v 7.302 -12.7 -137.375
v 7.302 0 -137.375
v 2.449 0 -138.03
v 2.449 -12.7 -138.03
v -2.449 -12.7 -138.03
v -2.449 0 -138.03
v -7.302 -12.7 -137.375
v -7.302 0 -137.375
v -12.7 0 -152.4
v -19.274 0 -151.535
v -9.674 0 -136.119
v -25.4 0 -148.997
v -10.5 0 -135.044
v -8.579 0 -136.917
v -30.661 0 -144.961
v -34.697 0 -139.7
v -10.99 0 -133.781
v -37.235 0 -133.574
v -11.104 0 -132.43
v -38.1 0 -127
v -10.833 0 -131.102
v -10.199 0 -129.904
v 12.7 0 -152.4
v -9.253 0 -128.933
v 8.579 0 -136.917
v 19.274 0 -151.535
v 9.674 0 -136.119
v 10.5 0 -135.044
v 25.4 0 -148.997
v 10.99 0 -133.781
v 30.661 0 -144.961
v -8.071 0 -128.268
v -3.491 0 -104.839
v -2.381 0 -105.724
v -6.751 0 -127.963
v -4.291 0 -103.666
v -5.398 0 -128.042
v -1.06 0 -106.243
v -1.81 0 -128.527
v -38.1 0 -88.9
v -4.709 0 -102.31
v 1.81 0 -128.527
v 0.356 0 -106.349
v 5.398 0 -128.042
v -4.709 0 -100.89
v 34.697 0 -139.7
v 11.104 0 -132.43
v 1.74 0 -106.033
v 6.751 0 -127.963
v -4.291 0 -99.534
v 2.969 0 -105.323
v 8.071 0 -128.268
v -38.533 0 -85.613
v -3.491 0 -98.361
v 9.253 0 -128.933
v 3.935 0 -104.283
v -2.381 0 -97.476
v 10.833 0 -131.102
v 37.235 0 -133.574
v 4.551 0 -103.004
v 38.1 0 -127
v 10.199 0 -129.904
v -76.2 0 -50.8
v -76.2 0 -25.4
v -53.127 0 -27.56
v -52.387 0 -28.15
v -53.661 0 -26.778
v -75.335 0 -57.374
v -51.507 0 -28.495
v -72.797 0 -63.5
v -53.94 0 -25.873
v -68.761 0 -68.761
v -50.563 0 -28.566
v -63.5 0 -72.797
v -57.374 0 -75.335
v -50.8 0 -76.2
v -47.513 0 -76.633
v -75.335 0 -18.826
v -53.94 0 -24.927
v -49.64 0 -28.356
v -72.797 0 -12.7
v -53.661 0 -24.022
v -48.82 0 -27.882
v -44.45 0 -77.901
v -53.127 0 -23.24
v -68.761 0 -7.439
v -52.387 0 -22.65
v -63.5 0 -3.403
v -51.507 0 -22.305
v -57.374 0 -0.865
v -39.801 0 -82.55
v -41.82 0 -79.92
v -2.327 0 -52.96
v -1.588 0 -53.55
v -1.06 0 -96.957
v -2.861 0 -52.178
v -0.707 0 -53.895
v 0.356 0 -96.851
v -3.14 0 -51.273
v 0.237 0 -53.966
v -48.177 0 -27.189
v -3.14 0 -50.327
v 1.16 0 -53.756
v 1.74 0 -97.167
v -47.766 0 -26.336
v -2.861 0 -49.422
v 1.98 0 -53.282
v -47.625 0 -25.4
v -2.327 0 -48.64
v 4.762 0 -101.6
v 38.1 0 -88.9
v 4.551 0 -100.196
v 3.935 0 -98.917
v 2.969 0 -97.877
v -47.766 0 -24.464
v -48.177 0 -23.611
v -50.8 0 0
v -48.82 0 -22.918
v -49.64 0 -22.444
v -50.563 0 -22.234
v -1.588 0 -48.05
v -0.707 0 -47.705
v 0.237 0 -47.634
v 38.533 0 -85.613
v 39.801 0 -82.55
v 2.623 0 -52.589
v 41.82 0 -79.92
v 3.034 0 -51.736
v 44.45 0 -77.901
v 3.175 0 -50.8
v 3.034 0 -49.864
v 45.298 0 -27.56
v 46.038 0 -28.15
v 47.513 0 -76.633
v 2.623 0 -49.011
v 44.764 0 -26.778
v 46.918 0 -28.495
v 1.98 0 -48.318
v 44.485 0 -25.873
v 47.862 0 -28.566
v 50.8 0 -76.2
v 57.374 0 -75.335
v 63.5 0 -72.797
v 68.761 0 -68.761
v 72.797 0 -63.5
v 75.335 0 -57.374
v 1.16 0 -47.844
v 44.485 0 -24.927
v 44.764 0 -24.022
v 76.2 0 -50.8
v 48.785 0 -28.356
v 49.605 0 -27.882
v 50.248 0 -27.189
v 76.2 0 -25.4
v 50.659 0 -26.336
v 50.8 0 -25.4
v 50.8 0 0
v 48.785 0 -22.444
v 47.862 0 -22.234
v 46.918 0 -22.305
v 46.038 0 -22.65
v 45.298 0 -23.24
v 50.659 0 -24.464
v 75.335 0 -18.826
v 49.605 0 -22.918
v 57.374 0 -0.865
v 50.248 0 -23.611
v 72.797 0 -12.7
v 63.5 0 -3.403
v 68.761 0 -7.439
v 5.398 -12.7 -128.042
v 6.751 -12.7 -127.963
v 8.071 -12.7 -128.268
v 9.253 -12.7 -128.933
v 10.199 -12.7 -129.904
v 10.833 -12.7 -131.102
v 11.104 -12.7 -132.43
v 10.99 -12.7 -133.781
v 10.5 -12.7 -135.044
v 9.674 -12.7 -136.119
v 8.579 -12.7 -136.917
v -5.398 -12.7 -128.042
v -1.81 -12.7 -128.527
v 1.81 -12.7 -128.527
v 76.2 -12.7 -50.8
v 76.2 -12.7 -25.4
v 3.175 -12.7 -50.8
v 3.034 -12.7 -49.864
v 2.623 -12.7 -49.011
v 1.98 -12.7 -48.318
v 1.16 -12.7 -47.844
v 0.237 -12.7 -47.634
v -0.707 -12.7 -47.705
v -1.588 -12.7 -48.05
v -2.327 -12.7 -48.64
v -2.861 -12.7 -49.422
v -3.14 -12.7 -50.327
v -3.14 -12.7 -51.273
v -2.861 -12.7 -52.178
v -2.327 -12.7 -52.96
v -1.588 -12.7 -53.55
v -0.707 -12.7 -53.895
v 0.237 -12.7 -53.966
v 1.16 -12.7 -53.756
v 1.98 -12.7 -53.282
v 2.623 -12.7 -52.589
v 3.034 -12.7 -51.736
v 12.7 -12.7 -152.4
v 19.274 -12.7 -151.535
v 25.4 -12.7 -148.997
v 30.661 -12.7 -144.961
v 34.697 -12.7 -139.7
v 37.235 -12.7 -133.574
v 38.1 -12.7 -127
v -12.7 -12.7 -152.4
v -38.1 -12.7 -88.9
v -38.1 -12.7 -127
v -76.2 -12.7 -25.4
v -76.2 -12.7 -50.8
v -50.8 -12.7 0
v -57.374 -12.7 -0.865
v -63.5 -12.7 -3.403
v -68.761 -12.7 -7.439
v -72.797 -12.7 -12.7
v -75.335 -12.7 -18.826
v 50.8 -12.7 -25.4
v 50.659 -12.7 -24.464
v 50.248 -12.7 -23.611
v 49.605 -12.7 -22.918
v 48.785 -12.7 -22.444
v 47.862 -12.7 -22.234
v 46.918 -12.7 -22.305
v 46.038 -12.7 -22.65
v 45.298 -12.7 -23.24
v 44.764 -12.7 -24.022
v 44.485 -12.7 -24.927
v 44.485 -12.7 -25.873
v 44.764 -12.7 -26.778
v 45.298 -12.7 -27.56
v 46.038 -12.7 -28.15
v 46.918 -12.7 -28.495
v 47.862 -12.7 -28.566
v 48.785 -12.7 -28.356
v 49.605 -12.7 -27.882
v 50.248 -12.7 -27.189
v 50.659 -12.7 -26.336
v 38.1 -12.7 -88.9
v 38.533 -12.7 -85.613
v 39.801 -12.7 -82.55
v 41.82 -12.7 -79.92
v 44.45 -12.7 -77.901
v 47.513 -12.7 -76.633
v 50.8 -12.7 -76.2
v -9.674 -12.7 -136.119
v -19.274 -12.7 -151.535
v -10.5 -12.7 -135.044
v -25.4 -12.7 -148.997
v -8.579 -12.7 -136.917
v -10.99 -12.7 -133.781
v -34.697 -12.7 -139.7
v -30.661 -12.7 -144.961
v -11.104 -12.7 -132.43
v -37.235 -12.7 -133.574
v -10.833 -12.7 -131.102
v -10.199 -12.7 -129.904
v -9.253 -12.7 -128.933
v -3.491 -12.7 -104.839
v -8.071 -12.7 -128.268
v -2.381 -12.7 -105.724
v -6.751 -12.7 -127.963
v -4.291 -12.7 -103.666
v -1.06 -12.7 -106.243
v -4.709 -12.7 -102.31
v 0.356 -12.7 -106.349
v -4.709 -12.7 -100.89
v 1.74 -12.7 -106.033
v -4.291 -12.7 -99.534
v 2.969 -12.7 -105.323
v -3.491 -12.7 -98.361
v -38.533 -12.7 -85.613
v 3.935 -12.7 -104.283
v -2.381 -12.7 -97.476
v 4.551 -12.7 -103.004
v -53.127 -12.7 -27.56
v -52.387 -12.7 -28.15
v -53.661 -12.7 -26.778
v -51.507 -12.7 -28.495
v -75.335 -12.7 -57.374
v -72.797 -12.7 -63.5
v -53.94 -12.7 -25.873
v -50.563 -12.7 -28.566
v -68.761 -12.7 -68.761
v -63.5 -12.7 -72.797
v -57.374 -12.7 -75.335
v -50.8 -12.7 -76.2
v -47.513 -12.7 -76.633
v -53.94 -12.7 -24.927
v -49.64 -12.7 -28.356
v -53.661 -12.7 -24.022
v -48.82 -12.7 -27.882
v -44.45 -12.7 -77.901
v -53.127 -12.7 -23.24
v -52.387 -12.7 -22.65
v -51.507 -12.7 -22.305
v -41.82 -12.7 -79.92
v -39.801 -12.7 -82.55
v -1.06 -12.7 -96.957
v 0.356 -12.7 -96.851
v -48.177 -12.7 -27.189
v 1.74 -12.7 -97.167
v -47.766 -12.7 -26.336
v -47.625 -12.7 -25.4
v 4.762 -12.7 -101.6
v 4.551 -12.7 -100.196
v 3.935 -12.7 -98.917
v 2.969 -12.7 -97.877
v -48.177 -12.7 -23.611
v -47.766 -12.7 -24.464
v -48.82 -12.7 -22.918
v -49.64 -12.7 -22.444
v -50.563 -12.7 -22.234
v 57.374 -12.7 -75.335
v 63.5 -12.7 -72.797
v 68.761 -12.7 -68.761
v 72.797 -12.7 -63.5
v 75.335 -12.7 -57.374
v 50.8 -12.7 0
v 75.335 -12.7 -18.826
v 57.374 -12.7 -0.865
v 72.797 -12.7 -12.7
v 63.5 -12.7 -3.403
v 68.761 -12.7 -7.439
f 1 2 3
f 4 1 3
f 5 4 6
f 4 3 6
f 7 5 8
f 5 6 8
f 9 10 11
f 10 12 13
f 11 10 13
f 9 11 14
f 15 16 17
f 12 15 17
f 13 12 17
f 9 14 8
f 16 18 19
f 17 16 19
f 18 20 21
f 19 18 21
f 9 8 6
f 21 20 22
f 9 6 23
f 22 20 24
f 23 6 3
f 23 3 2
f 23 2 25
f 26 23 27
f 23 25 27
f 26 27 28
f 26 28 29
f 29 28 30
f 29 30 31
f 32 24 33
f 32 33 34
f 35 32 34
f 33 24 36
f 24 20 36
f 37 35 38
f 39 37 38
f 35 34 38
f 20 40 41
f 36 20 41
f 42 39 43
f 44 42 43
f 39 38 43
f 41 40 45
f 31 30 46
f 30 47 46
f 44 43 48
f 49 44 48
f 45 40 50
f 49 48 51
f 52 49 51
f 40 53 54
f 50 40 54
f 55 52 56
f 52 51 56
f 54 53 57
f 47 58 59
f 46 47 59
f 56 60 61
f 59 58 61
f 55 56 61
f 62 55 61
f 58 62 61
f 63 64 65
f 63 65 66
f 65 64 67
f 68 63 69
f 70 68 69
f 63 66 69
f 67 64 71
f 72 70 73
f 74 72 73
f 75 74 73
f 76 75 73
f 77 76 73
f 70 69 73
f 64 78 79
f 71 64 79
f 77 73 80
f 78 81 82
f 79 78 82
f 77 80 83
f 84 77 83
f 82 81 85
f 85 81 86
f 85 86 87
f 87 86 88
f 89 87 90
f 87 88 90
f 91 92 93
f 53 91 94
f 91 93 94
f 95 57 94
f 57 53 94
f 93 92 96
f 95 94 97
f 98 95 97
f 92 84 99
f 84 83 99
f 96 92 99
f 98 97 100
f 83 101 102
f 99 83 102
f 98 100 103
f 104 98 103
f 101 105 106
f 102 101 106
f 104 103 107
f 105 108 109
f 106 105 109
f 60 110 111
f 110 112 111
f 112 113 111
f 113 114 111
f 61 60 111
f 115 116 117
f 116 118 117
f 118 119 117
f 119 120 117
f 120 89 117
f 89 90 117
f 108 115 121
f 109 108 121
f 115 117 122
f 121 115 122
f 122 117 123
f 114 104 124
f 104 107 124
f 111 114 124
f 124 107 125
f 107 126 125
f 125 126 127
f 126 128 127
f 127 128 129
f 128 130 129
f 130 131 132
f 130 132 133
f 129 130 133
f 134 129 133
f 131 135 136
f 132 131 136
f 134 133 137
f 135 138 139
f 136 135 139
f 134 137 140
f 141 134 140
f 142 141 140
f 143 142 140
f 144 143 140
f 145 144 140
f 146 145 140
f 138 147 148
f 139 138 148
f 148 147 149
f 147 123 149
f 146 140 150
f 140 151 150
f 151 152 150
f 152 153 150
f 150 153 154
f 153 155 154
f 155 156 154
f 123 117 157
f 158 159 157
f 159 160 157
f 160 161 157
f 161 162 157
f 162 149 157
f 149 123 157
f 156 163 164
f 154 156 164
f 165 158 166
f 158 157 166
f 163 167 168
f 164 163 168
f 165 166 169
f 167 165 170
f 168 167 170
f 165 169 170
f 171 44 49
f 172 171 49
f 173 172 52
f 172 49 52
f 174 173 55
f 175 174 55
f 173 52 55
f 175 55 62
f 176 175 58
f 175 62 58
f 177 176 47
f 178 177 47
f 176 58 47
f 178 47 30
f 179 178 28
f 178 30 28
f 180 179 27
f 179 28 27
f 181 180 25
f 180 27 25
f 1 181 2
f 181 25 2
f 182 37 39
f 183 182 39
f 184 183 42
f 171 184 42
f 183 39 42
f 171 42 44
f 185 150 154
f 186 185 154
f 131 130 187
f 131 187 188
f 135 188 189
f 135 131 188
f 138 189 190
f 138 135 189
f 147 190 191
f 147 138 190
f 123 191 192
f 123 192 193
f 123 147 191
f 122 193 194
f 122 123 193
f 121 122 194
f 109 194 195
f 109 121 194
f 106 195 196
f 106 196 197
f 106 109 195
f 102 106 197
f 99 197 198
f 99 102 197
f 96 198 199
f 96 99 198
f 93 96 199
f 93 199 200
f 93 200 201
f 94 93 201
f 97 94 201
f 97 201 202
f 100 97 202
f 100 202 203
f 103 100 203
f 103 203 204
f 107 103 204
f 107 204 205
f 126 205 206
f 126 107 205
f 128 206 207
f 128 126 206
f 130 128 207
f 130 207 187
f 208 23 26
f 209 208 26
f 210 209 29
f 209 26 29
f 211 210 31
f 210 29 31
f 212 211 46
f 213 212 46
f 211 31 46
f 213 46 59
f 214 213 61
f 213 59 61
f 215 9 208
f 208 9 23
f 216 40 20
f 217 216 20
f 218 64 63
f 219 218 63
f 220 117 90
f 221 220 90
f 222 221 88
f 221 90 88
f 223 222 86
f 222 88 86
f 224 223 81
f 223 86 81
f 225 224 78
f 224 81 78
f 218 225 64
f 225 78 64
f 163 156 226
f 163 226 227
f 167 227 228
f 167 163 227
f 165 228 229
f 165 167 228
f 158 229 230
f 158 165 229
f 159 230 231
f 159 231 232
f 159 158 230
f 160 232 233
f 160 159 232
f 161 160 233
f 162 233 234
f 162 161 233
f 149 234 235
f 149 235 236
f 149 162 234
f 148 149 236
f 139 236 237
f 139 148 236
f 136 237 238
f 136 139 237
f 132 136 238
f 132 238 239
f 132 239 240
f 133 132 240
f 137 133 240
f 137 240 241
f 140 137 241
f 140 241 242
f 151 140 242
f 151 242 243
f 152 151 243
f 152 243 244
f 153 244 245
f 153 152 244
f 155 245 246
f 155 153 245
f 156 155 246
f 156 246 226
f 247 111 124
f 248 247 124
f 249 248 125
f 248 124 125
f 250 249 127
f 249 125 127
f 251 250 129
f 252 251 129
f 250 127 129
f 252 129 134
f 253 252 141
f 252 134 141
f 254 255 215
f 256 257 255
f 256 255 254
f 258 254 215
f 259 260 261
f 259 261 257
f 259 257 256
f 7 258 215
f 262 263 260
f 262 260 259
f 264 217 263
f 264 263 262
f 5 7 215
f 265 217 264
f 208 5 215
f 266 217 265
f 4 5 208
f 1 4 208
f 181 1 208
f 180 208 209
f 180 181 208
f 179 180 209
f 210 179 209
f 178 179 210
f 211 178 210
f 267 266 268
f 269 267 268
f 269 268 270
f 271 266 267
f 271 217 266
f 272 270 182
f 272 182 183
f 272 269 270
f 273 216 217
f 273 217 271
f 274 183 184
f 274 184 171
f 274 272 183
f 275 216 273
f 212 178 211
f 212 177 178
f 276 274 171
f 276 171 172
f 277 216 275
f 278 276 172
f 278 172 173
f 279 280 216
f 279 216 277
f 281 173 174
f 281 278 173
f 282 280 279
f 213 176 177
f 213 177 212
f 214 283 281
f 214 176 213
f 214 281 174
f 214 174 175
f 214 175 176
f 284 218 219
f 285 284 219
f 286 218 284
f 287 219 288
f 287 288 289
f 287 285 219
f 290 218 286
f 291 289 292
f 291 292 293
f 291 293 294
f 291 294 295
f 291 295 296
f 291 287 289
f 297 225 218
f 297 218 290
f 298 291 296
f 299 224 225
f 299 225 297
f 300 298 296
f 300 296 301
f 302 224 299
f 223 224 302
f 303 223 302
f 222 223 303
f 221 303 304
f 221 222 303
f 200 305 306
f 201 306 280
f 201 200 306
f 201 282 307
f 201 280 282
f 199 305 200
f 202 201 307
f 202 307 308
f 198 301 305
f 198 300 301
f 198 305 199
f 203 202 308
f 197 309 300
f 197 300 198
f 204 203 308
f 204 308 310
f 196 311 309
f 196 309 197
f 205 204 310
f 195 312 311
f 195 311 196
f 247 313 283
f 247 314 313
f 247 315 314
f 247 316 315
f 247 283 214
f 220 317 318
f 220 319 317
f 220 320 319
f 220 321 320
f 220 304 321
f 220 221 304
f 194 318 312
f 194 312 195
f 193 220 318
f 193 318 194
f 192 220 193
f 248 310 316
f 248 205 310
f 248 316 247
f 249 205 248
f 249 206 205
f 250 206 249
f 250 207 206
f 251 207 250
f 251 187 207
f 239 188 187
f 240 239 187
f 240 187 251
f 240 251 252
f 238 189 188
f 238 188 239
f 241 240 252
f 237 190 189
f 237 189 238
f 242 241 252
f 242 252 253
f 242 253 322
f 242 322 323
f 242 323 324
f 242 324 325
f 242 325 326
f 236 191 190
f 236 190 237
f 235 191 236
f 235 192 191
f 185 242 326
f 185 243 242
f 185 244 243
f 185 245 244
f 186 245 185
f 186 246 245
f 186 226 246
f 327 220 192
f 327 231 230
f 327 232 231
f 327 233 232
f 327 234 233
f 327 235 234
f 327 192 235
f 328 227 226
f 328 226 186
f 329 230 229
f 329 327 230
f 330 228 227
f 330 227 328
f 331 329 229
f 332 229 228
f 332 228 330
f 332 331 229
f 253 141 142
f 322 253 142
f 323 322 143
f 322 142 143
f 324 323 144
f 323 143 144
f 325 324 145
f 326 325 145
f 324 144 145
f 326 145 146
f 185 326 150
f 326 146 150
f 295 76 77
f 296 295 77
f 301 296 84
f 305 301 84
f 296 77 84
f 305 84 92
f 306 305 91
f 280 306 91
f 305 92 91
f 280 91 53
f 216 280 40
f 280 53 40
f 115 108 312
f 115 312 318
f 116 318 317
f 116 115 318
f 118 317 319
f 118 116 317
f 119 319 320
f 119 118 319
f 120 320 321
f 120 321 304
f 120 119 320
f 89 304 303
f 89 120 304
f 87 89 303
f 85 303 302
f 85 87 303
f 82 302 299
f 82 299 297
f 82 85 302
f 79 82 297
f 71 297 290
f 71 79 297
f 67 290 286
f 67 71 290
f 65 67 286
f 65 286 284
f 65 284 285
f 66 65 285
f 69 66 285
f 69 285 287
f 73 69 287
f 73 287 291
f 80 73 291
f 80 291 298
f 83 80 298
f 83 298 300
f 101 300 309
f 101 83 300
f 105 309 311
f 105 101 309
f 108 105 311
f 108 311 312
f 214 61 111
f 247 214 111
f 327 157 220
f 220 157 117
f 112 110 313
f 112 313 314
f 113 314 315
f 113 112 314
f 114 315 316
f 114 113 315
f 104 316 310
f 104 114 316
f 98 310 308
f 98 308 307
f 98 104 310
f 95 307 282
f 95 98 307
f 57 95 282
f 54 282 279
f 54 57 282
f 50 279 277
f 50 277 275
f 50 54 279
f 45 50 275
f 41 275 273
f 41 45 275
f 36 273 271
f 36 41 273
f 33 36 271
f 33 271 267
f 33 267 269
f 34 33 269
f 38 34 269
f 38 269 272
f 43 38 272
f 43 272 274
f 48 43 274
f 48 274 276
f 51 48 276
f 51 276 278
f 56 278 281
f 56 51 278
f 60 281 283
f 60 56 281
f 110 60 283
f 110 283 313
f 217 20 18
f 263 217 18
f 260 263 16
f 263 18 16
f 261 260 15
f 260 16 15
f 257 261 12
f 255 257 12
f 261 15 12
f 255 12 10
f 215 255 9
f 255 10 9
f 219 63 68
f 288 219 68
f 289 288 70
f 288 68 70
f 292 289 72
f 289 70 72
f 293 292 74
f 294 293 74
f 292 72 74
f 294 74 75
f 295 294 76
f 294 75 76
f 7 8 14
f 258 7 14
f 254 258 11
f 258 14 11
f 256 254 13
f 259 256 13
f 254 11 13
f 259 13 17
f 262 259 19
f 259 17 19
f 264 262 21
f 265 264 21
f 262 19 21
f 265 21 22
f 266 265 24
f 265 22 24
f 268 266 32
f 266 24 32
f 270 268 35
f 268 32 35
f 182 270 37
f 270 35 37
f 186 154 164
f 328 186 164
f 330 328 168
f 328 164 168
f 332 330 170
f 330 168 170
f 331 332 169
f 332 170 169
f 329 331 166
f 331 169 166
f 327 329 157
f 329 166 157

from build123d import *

# Parameters (mm, degrees)
F0_R     = 4.7625
F0_R_2   = 3.175
F1_DEPTH = 12.7


with BuildPart() as f1:
    # F0 (on Front) → F1 (new body)
    with BuildSketch(Plane.XZ):
        with BuildLine():
            Line((50.8, 0), (-50.8, 0))
            ThreePointArc((-50.8, 0), (-68.760512, -7.439488), (-76.2, -25.4))
            Line((-76.2, -25.4), (-76.2, -50.8))
            ThreePointArc((-76.2, -50.8), (-68.760512, -68.760512), (-50.8, -76.2))
            ThreePointArc((-50.8, -76.2), (-41.819744, -79.919744), (-38.1, -88.9))
            Line((-38.1, -88.9), (-38.1, -127))
            ThreePointArc((-38.1, -127), (-30.660512, -144.960512), (-12.7, -152.4))
            Line((-12.7, -152.4), (12.7, -152.4))
            ThreePointArc((12.7, -152.4), (30.660512, -144.960512), (38.1, -127))
            Line((38.1, -127), (38.1, -88.9))
            ThreePointArc((38.1, -88.9), (41.819744, -79.919744), (50.8, -76.2))
            ThreePointArc((50.8, -76.2), (68.760512, -68.760512), (76.2, -50.8))
            Line((76.2, -50.8), (76.2, -25.4))
            ThreePointArc((76.2, -25.4), (68.760512, -7.439488), (50.8, 0))
        make_face()
        with BuildLine():
            ThreePointArc((-7.3025, -137.374798), (-11.016278, -131.75602), (-5.3975, -128.042242))
            ThreePointArc((-5.3975, -128.042242), (0, -128.5875), (5.3975, -128.042242))
            ThreePointArc((5.3975, -128.042242), (11.016278, -131.75602), (7.3025, -137.374798))
            ThreePointArc((7.3025, -137.374798), (0, -138.1125), (-7.3025, -137.374798))
        make_face(mode=Mode.SUBTRACT)
        with Locations((0, -101.6)):
            Circle(F0_R, mode=Mode.SUBTRACT)
        with Locations((-50.8, -25.4)):
            Circle(F0_R_2, mode=Mode.SUBTRACT)
        with Locations((0, -50.8)):
            Circle(F0_R_2, mode=Mode.SUBTRACT)
        with Locations((47.625, -25.4)):
            Circle(F0_R_2, mode=Mode.SUBTRACT)
    extrude(amount=F1_DEPTH)


solid = f1.part
